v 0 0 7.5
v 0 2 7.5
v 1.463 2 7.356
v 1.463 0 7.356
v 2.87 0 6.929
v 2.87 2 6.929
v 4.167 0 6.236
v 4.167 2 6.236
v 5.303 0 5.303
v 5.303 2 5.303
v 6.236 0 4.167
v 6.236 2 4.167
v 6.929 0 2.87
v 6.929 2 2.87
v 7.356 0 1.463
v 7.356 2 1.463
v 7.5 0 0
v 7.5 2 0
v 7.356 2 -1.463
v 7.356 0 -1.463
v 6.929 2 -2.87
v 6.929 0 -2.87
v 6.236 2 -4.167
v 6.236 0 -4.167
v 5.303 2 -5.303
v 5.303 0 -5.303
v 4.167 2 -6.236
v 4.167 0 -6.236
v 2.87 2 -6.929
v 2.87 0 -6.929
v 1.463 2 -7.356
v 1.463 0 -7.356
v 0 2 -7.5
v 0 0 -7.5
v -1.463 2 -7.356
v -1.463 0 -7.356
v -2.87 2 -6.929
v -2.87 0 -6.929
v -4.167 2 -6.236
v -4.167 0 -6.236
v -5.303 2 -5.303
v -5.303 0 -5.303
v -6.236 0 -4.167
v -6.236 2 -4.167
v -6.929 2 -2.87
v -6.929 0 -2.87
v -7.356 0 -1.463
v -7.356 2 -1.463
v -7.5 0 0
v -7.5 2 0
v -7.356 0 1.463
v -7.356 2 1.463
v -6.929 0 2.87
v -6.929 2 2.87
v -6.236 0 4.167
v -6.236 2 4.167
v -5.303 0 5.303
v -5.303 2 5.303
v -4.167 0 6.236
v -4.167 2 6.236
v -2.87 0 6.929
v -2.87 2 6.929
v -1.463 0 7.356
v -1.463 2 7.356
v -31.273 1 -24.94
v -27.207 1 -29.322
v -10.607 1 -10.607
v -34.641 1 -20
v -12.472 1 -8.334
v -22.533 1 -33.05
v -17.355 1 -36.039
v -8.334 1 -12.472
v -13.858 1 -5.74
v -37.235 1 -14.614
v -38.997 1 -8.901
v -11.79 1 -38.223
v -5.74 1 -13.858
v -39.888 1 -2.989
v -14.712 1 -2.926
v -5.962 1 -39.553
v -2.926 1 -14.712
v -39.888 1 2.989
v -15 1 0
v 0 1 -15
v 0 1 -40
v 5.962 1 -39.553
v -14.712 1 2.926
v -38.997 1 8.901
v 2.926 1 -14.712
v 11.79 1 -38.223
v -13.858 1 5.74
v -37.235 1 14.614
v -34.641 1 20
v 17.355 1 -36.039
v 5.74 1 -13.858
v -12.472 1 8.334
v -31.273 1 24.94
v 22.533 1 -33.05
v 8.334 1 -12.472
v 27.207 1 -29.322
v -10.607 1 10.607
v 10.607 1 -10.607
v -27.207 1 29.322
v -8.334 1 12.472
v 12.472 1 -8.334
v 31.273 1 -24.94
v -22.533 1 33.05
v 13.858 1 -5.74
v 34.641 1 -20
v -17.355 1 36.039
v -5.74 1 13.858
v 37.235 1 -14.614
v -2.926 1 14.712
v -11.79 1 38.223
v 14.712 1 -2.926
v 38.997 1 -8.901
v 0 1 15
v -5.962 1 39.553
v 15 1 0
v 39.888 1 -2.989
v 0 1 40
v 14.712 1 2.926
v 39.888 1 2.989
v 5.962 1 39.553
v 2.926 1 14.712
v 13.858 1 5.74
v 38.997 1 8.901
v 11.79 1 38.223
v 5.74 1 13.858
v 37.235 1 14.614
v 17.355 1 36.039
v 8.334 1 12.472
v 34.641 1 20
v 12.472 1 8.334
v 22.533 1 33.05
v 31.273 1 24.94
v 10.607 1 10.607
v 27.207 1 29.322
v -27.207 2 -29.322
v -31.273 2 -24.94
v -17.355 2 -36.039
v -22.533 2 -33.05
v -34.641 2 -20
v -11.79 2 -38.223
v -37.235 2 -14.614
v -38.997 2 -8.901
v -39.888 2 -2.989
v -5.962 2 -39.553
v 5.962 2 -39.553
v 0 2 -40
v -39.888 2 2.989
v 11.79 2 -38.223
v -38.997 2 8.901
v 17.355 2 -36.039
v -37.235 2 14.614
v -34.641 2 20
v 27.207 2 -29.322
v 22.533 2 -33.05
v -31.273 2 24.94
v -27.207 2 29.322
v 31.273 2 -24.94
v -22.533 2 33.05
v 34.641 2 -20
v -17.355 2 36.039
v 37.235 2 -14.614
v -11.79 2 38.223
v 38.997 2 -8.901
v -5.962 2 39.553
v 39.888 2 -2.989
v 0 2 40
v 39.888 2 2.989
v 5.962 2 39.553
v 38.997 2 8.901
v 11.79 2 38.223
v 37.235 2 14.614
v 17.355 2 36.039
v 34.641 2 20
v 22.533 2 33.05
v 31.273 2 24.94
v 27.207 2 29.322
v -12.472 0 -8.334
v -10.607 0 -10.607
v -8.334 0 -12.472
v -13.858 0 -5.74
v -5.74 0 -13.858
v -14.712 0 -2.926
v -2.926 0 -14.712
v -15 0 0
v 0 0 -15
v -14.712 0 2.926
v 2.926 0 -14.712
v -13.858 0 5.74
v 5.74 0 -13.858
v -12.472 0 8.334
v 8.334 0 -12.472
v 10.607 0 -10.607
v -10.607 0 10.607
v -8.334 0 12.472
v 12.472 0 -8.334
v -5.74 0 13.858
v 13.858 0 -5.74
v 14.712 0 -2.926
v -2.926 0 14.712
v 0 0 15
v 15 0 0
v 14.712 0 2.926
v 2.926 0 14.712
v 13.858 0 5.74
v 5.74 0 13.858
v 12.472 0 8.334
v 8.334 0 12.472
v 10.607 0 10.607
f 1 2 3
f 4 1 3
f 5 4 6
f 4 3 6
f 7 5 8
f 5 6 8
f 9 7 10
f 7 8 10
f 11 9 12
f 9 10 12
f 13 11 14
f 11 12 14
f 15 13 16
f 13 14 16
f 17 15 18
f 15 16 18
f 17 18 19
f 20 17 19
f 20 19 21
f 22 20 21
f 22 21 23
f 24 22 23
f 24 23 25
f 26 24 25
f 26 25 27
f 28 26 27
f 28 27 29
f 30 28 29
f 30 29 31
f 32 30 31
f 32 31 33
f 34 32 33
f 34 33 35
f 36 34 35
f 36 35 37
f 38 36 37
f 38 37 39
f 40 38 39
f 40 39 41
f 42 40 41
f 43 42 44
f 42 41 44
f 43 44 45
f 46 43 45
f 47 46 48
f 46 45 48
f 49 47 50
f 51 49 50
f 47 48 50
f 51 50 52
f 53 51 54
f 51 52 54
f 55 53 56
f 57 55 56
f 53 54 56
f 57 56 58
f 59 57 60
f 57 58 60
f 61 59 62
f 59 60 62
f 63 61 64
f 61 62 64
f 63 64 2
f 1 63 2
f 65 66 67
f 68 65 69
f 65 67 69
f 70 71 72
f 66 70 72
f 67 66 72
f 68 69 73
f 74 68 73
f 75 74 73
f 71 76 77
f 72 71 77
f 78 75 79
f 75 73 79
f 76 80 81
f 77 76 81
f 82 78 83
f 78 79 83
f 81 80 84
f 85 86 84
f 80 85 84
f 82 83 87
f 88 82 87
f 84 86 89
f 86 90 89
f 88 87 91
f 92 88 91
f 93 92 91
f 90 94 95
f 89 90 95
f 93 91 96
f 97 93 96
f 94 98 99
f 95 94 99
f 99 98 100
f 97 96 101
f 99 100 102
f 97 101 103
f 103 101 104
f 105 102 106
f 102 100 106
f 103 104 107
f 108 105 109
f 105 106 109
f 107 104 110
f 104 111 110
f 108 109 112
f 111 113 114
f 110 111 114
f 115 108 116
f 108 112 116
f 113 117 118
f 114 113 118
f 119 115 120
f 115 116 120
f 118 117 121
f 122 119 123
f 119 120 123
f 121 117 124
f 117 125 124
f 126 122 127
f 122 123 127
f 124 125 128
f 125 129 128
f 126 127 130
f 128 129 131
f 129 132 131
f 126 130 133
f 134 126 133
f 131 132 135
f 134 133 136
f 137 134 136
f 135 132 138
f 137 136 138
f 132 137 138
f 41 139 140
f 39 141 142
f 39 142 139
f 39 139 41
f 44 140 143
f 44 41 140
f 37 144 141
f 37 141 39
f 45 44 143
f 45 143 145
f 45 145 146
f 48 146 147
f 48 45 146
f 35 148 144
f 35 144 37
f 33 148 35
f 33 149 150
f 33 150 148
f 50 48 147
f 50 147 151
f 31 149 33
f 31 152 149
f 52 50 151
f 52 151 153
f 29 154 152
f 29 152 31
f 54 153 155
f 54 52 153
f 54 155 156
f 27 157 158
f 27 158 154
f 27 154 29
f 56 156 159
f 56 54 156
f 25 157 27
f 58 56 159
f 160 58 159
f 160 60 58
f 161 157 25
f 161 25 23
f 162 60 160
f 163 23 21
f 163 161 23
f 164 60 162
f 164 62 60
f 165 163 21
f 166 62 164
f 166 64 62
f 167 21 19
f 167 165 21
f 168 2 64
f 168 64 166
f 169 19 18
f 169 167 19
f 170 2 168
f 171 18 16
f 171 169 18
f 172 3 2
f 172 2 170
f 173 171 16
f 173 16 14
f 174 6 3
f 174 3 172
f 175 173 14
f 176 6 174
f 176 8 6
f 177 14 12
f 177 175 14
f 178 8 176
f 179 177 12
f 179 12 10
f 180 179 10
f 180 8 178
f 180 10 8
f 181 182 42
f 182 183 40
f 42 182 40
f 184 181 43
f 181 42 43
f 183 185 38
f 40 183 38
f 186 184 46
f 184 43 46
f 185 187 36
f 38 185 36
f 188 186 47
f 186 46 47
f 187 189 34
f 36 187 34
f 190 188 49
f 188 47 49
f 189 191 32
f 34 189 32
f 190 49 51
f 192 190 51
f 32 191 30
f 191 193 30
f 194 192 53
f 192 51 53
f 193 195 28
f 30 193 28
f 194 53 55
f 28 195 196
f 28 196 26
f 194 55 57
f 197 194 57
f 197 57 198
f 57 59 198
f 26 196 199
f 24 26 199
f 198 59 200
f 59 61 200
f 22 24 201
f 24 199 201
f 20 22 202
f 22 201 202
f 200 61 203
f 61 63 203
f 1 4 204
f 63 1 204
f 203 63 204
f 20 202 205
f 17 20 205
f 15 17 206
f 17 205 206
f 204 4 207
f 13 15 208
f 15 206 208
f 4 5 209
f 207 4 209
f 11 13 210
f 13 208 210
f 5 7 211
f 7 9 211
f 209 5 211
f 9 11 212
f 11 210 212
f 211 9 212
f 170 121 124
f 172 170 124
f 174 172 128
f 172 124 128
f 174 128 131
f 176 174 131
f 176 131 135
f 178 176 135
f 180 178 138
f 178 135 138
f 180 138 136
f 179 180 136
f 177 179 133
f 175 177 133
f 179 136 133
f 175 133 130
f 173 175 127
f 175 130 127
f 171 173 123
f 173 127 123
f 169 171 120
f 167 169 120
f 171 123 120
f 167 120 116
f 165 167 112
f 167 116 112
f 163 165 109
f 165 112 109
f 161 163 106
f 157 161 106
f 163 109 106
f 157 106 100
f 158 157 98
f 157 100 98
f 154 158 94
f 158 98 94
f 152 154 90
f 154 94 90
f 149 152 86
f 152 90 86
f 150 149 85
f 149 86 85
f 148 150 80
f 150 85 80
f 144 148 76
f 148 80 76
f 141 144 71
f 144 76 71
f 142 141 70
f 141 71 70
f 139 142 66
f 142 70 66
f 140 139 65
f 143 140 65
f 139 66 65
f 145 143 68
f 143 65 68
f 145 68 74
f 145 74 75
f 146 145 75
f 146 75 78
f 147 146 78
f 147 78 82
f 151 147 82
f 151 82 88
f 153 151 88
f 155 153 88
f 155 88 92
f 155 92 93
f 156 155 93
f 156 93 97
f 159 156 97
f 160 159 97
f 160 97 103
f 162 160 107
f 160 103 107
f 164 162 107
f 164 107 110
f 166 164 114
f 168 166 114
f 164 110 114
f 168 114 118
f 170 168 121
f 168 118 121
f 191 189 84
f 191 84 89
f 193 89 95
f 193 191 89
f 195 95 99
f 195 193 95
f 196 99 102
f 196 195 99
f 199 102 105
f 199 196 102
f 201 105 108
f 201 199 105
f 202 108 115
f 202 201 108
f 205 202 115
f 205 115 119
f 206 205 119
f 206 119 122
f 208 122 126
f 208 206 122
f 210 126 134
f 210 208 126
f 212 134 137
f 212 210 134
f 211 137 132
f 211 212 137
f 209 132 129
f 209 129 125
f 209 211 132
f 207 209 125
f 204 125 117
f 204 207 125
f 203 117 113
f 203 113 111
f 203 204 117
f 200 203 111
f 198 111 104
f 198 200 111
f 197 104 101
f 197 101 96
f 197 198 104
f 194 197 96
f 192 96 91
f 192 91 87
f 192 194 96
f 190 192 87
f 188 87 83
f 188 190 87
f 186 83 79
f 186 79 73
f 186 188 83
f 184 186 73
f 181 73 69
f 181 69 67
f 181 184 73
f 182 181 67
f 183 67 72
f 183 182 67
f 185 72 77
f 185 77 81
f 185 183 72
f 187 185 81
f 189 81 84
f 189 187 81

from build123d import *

# Parameters (mm, degrees)
SKETCH_1_R          = 22.5
EXTRUDE_1_DEPTH     = 1
SKETCH_2_R          = 40
EXTRUDE_2_DEPTH     = 1
SKETCH_3_R          = 7.5
CUT_EXTRUDE_1_DEPTH = 500
SKETCH_5_R          = 22.5
SKETCH_5_R_2        = 15
CUT_EXTRUDE_3_DEPTH = 1


with BuildPart() as part:
    # 草图1 → 凸台-拉伸1 (new body)
    with BuildSketch(Plane(origin=(0, 0, 0), x_dir=(1, 0, 0), z_dir=(0, 1, 0))):
        with Locations(Location((0, 0, 0), (0, 0, 270))):
            Circle(SKETCH_1_R)
    extrude(amount=EXTRUDE_1_DEPTH)

    # 草图2 → 凸台-拉伸2 (add)
    with BuildSketch(Plane(origin=(0, 1, 0), x_dir=(1, 0, 0), z_dir=(0, 1, 0))):
        with Locations(Location((0, 0, 0), (0, 0, 270))):
            Circle(SKETCH_2_R)
    extrude(amount=EXTRUDE_2_DEPTH)

    # 草图3 → 切除-拉伸1 (cut)
    with BuildSketch(Plane(origin=(0, 2, 0), x_dir=(1, 0, 0), z_dir=(0, 1, 0))):
        with Locations(Location((0, 0, 0), (0, 0, 270))):
            Circle(SKETCH_3_R)
    extrude(amount=-CUT_EXTRUDE_1_DEPTH, mode=Mode.SUBTRACT)

    # 草图5 → 切除-拉伸3 (cut)
    with BuildSketch(Plane.XZ):
        Circle(SKETCH_5_R)
        with Locations(Location((0, 0, 0), (0, 0, 270))):
            Circle(SKETCH_5_R_2, mode=Mode.SUBTRACT)
    extrude(amount=-CUT_EXTRUDE_3_DEPTH, mode=Mode.SUBTRACT)


solid = part.part
